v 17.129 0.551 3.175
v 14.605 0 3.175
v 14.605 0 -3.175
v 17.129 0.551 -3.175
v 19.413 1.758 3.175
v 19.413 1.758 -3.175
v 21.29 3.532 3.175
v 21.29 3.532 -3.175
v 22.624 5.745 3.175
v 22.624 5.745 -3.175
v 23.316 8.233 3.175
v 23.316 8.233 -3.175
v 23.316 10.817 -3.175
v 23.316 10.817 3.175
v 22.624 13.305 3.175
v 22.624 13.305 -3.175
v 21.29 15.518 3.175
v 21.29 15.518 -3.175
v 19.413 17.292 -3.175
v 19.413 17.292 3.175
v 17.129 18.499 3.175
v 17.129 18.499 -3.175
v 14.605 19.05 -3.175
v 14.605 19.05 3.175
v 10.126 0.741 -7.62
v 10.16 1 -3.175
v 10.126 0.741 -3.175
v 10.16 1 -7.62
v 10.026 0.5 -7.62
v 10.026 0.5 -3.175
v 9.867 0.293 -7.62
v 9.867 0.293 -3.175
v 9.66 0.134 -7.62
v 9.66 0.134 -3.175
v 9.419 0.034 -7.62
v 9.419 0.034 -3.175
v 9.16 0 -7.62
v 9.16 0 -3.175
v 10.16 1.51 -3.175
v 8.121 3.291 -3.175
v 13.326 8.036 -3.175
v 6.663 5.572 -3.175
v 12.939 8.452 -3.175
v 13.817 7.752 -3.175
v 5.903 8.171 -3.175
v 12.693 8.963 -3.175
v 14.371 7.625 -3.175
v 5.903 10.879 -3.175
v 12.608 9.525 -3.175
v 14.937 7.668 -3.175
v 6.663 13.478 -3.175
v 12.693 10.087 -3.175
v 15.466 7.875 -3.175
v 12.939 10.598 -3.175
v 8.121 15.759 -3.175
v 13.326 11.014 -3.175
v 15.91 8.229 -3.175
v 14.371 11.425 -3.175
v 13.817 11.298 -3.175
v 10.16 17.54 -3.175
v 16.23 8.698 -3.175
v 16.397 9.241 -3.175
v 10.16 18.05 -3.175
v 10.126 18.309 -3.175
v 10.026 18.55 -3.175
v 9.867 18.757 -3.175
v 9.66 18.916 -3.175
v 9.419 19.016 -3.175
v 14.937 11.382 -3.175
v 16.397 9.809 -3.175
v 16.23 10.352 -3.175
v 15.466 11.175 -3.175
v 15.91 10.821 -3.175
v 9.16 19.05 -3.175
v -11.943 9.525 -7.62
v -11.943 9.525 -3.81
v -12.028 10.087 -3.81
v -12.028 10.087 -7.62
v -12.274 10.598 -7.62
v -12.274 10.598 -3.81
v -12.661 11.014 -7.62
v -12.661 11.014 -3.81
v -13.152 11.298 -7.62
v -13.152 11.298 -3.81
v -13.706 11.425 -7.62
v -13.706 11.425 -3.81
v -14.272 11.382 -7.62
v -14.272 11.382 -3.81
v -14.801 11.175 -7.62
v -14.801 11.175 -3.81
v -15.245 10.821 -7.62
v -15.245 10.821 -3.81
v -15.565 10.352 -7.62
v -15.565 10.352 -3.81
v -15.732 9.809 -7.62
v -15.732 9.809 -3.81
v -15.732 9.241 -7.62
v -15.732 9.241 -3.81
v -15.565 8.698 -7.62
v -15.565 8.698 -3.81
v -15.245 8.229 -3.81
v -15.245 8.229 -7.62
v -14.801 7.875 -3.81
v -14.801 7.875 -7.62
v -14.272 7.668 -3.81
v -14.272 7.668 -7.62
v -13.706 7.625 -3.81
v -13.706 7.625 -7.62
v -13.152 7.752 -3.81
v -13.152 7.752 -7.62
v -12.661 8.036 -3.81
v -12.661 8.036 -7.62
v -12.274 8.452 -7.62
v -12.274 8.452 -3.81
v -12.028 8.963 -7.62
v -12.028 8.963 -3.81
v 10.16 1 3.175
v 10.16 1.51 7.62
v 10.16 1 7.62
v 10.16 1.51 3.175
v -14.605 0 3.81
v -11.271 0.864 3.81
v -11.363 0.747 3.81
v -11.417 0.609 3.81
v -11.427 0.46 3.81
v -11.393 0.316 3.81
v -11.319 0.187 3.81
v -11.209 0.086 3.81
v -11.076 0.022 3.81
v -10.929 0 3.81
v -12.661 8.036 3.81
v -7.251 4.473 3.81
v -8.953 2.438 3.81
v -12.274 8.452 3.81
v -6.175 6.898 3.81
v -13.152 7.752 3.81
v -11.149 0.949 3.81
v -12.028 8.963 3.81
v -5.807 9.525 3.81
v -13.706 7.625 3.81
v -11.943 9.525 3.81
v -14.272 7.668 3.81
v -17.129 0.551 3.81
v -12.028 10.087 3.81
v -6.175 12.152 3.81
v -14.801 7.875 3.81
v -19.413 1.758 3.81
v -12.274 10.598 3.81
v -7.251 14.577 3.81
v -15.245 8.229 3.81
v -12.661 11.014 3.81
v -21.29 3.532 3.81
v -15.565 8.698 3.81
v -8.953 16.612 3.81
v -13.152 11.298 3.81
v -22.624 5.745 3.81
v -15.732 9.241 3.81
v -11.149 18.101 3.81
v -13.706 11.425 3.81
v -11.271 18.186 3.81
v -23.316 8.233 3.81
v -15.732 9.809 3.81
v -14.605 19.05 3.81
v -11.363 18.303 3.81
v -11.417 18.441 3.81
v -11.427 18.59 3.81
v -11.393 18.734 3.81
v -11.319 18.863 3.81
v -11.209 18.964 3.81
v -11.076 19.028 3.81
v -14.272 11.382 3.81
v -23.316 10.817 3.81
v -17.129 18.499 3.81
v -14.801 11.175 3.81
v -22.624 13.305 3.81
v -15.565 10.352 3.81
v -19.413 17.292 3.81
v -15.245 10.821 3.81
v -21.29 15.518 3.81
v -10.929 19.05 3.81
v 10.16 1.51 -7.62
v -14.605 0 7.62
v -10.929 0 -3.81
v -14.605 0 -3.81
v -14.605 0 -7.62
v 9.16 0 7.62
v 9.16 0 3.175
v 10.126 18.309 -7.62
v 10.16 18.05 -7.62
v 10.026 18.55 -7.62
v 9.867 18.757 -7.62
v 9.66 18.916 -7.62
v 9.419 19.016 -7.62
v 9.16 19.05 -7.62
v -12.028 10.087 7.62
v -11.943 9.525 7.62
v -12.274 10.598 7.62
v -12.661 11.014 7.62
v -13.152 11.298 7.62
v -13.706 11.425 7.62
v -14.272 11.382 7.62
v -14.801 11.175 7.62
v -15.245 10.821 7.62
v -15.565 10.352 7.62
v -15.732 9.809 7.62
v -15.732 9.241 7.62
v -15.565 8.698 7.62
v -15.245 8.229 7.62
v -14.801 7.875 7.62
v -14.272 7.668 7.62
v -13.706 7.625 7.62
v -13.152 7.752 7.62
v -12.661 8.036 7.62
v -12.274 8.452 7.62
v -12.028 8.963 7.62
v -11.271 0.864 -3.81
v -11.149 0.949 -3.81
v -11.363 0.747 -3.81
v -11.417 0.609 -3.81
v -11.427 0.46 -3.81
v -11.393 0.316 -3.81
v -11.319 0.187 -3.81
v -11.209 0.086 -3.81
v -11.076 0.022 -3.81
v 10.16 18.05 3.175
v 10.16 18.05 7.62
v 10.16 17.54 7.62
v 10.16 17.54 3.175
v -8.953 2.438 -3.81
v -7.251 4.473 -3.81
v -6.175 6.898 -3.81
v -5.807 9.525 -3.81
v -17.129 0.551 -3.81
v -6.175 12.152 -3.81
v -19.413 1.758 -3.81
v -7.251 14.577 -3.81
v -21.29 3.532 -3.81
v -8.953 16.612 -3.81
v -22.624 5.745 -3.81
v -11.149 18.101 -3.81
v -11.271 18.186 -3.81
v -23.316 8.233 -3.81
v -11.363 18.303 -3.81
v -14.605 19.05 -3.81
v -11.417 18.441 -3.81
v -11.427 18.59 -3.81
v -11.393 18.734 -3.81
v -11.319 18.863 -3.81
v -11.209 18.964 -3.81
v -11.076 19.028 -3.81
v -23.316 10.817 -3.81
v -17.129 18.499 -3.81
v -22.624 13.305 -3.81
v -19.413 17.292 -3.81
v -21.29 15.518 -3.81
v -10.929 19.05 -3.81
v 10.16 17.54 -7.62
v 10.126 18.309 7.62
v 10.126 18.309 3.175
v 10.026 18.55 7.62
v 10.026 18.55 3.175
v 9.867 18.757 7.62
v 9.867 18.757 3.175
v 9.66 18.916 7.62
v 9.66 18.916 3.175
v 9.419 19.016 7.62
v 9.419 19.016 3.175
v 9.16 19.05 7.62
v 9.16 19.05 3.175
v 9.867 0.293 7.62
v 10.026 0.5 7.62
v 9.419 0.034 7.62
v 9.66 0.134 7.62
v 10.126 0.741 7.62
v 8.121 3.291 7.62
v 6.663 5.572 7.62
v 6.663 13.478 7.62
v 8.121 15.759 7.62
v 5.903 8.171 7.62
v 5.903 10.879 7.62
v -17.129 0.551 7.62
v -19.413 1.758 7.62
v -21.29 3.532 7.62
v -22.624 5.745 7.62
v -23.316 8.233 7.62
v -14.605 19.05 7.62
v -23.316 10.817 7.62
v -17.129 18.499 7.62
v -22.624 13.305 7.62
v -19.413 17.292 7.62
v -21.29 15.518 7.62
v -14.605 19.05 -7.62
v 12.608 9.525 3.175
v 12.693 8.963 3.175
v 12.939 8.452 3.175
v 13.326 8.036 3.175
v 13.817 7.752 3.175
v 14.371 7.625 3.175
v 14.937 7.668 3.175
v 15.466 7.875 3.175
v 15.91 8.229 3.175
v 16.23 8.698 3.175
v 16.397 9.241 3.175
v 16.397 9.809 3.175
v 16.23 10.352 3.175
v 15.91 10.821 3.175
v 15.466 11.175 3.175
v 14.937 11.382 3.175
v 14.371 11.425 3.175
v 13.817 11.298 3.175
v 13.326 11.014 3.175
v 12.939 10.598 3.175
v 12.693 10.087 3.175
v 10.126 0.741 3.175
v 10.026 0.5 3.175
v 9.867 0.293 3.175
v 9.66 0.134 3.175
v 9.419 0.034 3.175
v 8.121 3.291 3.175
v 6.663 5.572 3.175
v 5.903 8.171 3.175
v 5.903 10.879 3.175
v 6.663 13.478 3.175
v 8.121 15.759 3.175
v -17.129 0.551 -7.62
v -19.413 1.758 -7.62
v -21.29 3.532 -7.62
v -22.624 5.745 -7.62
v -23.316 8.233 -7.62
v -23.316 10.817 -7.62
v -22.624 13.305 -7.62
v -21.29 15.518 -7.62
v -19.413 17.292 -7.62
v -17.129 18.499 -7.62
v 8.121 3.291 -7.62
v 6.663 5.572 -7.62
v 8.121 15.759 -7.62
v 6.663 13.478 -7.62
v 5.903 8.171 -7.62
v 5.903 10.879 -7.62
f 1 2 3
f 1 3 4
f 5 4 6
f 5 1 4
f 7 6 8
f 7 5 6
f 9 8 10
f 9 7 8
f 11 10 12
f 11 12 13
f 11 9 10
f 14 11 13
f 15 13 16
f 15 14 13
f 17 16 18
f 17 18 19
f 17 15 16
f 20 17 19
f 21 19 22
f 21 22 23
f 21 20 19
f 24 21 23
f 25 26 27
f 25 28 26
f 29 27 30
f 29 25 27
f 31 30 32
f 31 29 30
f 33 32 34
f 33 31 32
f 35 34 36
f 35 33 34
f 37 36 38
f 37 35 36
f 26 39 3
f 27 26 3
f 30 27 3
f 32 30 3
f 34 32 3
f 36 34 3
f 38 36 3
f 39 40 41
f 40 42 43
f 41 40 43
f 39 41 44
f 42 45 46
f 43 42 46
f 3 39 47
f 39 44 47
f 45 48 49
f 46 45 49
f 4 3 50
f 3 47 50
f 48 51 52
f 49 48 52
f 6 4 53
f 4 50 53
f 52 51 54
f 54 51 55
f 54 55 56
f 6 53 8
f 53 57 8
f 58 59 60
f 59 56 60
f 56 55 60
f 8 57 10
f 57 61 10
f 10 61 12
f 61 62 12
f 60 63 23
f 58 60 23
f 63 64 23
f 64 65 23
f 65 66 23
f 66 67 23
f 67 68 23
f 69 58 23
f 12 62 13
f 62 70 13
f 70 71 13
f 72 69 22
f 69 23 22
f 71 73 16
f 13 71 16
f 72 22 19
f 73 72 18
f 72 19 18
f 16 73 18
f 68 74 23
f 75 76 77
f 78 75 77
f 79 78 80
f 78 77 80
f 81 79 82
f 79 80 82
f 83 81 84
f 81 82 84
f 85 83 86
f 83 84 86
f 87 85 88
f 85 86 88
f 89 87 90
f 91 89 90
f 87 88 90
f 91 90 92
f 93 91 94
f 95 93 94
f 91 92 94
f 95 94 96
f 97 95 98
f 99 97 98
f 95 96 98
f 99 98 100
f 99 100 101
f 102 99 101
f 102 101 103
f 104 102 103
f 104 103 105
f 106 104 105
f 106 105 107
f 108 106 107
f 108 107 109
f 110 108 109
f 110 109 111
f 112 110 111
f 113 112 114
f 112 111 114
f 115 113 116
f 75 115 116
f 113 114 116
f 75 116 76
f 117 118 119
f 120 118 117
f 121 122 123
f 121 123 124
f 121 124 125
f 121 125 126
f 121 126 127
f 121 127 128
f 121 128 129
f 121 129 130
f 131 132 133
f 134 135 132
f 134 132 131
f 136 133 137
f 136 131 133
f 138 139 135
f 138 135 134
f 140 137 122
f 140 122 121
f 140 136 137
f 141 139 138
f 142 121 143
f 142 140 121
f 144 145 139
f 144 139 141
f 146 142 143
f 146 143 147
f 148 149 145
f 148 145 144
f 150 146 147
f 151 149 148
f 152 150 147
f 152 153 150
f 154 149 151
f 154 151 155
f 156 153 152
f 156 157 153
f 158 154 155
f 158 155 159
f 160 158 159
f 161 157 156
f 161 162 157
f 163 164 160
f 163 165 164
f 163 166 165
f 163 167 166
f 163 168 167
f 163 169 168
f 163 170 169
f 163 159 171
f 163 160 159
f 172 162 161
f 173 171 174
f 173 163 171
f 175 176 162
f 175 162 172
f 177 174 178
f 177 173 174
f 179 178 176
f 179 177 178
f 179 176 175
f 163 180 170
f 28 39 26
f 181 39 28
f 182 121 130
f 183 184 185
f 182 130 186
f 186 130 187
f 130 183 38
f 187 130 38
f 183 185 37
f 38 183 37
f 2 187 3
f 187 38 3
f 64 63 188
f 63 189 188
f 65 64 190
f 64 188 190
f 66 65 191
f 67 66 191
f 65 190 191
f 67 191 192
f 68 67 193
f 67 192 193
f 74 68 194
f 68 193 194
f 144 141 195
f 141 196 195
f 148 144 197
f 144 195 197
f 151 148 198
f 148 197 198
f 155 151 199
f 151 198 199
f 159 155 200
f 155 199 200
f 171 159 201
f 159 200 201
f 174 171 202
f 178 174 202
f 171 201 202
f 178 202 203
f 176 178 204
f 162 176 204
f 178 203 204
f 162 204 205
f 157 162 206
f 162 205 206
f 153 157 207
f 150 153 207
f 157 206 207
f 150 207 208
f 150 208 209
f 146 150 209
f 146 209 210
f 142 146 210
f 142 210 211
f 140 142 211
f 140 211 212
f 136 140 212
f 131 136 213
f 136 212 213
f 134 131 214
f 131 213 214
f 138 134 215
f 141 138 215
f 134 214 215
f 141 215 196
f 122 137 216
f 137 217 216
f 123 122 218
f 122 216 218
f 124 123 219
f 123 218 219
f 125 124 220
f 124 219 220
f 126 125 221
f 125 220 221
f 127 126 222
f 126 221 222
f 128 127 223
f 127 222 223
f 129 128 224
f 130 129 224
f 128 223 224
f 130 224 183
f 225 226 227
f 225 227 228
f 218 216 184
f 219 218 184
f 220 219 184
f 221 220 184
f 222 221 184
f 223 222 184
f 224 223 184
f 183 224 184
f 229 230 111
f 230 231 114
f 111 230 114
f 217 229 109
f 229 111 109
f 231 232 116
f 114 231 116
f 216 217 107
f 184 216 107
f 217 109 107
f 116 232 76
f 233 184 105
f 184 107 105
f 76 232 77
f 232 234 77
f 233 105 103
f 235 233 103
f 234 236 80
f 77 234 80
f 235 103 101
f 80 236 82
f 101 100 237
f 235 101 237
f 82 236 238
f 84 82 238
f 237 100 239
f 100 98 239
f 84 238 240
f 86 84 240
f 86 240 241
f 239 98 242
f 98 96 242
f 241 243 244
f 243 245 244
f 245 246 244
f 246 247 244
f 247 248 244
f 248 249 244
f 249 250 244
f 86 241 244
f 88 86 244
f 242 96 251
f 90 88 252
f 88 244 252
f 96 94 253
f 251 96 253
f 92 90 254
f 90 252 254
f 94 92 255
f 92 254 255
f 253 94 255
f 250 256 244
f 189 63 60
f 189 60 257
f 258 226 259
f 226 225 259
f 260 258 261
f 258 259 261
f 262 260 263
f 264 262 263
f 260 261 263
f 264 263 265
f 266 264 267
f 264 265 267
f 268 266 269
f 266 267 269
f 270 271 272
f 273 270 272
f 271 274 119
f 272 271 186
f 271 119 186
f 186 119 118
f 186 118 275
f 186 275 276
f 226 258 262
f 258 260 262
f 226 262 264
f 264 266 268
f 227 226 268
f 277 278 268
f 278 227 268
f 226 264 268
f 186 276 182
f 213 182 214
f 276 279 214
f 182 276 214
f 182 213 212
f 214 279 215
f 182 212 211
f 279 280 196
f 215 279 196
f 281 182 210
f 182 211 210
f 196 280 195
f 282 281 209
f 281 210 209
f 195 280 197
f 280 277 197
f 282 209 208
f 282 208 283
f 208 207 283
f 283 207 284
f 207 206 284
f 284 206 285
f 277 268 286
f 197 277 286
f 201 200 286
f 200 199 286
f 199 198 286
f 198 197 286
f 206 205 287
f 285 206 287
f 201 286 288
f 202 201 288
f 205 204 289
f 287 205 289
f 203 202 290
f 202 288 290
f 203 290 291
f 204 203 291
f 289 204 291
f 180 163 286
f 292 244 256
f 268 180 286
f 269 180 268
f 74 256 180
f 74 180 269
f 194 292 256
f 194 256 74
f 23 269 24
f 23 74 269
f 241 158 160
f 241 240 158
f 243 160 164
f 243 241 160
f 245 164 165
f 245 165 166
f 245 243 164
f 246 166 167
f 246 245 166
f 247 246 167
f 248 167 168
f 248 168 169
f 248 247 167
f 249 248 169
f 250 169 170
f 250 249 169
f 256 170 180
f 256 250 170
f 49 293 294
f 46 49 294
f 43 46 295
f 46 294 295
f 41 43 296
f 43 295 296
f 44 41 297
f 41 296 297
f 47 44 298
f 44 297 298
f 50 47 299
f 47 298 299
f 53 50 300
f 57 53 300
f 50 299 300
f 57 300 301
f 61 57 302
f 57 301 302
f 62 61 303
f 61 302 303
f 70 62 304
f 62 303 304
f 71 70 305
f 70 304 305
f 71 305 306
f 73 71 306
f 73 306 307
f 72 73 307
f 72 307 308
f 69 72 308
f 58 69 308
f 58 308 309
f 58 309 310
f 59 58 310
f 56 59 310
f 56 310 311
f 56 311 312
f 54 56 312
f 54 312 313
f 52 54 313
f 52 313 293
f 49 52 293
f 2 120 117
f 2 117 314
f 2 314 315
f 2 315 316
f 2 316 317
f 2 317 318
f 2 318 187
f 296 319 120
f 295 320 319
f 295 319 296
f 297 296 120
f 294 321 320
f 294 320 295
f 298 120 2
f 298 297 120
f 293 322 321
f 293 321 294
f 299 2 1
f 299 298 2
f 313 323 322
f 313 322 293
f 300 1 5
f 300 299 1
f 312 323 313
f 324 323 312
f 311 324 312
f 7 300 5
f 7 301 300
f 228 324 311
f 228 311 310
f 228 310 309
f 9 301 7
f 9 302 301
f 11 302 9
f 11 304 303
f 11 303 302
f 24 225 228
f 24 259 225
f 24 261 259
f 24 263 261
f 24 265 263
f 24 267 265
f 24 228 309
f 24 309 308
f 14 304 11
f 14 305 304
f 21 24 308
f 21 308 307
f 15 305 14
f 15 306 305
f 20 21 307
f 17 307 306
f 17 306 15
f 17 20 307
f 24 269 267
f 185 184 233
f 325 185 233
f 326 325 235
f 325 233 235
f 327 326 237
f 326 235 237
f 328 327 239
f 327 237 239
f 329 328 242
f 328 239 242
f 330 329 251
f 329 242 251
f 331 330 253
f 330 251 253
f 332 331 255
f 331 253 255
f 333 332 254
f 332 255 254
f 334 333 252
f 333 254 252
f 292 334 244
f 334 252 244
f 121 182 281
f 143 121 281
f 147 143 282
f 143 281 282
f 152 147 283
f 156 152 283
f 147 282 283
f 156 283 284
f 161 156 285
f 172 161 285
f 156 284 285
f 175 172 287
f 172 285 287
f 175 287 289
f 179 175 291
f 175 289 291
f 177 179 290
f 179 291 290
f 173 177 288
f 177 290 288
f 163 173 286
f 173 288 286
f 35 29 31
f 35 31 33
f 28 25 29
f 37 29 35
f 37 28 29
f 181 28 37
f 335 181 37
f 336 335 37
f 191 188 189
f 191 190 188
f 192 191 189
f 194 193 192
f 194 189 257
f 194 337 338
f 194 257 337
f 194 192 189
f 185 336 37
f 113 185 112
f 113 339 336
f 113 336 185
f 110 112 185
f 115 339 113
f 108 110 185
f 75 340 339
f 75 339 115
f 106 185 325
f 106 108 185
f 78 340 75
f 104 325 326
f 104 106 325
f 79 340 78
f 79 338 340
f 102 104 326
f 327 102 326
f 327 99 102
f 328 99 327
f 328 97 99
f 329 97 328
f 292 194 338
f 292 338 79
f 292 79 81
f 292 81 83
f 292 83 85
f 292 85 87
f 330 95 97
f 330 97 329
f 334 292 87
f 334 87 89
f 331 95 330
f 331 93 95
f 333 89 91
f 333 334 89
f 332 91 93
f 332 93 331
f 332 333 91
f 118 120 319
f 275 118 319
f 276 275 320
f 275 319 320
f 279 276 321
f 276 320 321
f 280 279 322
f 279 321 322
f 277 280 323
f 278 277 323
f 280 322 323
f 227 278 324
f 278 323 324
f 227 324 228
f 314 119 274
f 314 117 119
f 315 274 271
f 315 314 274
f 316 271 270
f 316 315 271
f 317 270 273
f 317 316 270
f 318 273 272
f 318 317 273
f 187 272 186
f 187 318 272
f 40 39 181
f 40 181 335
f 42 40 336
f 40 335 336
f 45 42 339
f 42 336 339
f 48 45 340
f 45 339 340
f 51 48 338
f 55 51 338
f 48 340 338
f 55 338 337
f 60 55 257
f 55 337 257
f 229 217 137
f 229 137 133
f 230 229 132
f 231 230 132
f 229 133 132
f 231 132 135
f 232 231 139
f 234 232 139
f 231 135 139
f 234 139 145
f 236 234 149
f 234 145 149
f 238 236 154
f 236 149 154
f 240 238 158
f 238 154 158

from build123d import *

# Parameters (mm, degrees)
SKETCH1_W               = 29.21
SKETCH1_H               = 15.24
BOSS_EXTRUDE1_DEPTH     = 19.05
BOSS_EXTRUDE2_DEPTH     = 3.175
BOSS_EXTRUDE3_DEPTH     = 3.81
LPATTERN1_COUNT         = 2
LPATTERN1_PITCH         = 11.43
SKETCH7_R               = 1.905
CUT_EXTRUDE2_DEPTH      = 8.62
CUT_EXTRUDE2_DEPTH_BACK = 8.62
CUT_EXTRUDE4_DEPTH      = 2.794
CUT_EXTRUDE4_DEPTH_BACK = 3.175
CUT_EXTRUDE5_DEPTH      = 5.842
CUT_EXTRUDE6_DEPTH      = 3.81
FILLET2_R               = 0.5
SKETCH16_R              = 1.905
CUT_EXTRUDE8_DEPTH      = 2.27
CUT_EXTRUDE8_DEPTH_BACK = 14.97
SKETCH17_W              = 4.445
SKETCH17_H              = 4.445
CUT_EXTRUDE9_DEPTH      = 19.05
LPATTERN2_COUNT         = 2
LPATTERN2_PITCH         = 10.795
FILLET4_R               = 1


with BuildPart() as part:
    # Sketch1 → Boss-Extrude1 (new body)
    with BuildSketch(Plane(origin=(0, 0, 0), x_dir=(1, 0, 0), z_dir=(0, 1, 0))):
        Rectangle(SKETCH1_W, SKETCH1_H)
    extrude(amount=BOSS_EXTRUDE1_DEPTH)

    # Sketch3 → Boss-Extrude2 (add, symmetric)
    with BuildSketch(Plane.XY):
        with BuildLine():
            Line((14.605, 19.05), (14.605, 0))
            ThreePointArc((14.605, 0), (23.403337922, 9.525), (14.605, 19.05))
        make_face()
    extrude(amount=BOSS_EXTRUDE2_DEPTH, both=True)

    # Sketch6 → Boss-Extrude3 (add)
    with BuildSketch(Plane.XY.offset(7.62)):
        with BuildLine():
            Line((-14.605, 19.05), (-14.605, 0))
            ThreePointArc((-14.605, 0), (-23.403337922, 9.525), (-14.605, 19.05))
        make_face()
    boss_extrude3 = extrude(amount=-BOSS_EXTRUDE3_DEPTH)

    # LPattern1: Boss-Extrude3 ×2
    with Locations(*[(0, 0, -i * LPATTERN1_PITCH) for i in range(1, LPATTERN1_COUNT)]):
        add(boss_extrude3)

    # Sketch7 → Cut-Extrude2 (cut, two sides)
    with BuildSketch(Plane.XY) as cut_extrude2_sk:
        with Locations((-13.848330108, 9.525)):
            Circle(SKETCH7_R)
    extrude(amount=CUT_EXTRUDE2_DEPTH, mode=Mode.SUBTRACT)
    extrude(cut_extrude2_sk.sketch, amount=-CUT_EXTRUDE2_DEPTH_BACK, mode=Mode.SUBTRACT)

    # Sketch9 → Cut-Extrude4 (cut, two sides)
    with BuildSketch(Plane.XY.offset(6.35)) as cut_extrude4_sk:
        with BuildLine():
            Line((14.605, 19.05), (14.605, 0))
            ThreePointArc((14.605, 0), (5.806662078, 9.525), (14.605, 19.05))
        make_face()
    extrude(amount=CUT_EXTRUDE4_DEPTH, mode=Mode.SUBTRACT)
    extrude(cut_extrude4_sk.sketch, amount=-CUT_EXTRUDE4_DEPTH_BACK, mode=Mode.SUBTRACT)

    # Sketch11 → Cut-Extrude5 (cut)
    with BuildSketch(Plane.XY.offset(-9.017)):
        with BuildLine():
            Line((14.605, 19.05), (14.605, 0))
            ThreePointArc((14.605, 0), (5.806662078, 9.525), (14.605, 19.05))
        make_face()
    extrude(amount=CUT_EXTRUDE5_DEPTH, mode=Mode.SUBTRACT)

    # Sketch12 → Cut-Extrude6 (cut, symmetric)
    with BuildSketch(Plane.XY):
        with BuildLine():
            Line((-14.605, 19.05), (-14.605, 0))
            ThreePointArc((-14.605, 0), (-5.806662078, 9.525), (-14.605, 19.05))
        make_face()
    extrude(amount=CUT_EXTRUDE6_DEPTH, both=True, mode=Mode.SUBTRACT)

    # Fillet2
    fillet2_edges = [part.edges().sort_by_distance(p)[0] for p in [
        (-14.605, 0, 0),
        (-14.605, 19.05, 0),
    ]]
    fillet(fillet2_edges, radius=FILLET2_R)

    # Sketch16 → Cut-Extrude8 (cut, two sides)
    with BuildSketch(Plane.XY.offset(6.35)) as cut_extrude8_sk:
        with Locations(Location((14.513337922, 9.525, 0), (0, 0, 180))):  # turned: the seam where the file's is
            Circle(SKETCH16_R)
    extrude(amount=CUT_EXTRUDE8_DEPTH, mode=Mode.SUBTRACT)
    extrude(cut_extrude8_sk.sketch, amount=-CUT_EXTRUDE8_DEPTH_BACK, mode=Mode.SUBTRACT)

    # Sketch17 → Cut-Extrude9 (cut)
    with BuildSketch(Plane(origin=(0, 19.05, 0), x_dir=(1, 0, 0), z_dir=(0, 1, 0))):
        with Locations((12.3825, 5.3975)):
            Rectangle(SKETCH17_W, SKETCH17_H)
    cut_extrude9 = extrude(amount=-CUT_EXTRUDE9_DEPTH, mode=Mode.SUBTRACT)

    # LPattern2: Cut-Extrude9 ×2
    with Locations(*[(0, 0, i * LPATTERN2_PITCH) for i in range(1, LPATTERN2_COUNT)]):
        add(cut_extrude9, mode=Mode.SUBTRACT)

    # Fillet4
    fillet4_edges = [part.edges().sort_by_distance(p)[0] for p in [
        (10.16, 19.05, -5.3975),
        (10.16, 0, -5.3975),
        (10.16, 0, 5.3975),
        (10.16, 19.05, 5.3975),
    ]]
    fillet(fillet4_edges, radius=FILLET4_R)


solid = part.part
